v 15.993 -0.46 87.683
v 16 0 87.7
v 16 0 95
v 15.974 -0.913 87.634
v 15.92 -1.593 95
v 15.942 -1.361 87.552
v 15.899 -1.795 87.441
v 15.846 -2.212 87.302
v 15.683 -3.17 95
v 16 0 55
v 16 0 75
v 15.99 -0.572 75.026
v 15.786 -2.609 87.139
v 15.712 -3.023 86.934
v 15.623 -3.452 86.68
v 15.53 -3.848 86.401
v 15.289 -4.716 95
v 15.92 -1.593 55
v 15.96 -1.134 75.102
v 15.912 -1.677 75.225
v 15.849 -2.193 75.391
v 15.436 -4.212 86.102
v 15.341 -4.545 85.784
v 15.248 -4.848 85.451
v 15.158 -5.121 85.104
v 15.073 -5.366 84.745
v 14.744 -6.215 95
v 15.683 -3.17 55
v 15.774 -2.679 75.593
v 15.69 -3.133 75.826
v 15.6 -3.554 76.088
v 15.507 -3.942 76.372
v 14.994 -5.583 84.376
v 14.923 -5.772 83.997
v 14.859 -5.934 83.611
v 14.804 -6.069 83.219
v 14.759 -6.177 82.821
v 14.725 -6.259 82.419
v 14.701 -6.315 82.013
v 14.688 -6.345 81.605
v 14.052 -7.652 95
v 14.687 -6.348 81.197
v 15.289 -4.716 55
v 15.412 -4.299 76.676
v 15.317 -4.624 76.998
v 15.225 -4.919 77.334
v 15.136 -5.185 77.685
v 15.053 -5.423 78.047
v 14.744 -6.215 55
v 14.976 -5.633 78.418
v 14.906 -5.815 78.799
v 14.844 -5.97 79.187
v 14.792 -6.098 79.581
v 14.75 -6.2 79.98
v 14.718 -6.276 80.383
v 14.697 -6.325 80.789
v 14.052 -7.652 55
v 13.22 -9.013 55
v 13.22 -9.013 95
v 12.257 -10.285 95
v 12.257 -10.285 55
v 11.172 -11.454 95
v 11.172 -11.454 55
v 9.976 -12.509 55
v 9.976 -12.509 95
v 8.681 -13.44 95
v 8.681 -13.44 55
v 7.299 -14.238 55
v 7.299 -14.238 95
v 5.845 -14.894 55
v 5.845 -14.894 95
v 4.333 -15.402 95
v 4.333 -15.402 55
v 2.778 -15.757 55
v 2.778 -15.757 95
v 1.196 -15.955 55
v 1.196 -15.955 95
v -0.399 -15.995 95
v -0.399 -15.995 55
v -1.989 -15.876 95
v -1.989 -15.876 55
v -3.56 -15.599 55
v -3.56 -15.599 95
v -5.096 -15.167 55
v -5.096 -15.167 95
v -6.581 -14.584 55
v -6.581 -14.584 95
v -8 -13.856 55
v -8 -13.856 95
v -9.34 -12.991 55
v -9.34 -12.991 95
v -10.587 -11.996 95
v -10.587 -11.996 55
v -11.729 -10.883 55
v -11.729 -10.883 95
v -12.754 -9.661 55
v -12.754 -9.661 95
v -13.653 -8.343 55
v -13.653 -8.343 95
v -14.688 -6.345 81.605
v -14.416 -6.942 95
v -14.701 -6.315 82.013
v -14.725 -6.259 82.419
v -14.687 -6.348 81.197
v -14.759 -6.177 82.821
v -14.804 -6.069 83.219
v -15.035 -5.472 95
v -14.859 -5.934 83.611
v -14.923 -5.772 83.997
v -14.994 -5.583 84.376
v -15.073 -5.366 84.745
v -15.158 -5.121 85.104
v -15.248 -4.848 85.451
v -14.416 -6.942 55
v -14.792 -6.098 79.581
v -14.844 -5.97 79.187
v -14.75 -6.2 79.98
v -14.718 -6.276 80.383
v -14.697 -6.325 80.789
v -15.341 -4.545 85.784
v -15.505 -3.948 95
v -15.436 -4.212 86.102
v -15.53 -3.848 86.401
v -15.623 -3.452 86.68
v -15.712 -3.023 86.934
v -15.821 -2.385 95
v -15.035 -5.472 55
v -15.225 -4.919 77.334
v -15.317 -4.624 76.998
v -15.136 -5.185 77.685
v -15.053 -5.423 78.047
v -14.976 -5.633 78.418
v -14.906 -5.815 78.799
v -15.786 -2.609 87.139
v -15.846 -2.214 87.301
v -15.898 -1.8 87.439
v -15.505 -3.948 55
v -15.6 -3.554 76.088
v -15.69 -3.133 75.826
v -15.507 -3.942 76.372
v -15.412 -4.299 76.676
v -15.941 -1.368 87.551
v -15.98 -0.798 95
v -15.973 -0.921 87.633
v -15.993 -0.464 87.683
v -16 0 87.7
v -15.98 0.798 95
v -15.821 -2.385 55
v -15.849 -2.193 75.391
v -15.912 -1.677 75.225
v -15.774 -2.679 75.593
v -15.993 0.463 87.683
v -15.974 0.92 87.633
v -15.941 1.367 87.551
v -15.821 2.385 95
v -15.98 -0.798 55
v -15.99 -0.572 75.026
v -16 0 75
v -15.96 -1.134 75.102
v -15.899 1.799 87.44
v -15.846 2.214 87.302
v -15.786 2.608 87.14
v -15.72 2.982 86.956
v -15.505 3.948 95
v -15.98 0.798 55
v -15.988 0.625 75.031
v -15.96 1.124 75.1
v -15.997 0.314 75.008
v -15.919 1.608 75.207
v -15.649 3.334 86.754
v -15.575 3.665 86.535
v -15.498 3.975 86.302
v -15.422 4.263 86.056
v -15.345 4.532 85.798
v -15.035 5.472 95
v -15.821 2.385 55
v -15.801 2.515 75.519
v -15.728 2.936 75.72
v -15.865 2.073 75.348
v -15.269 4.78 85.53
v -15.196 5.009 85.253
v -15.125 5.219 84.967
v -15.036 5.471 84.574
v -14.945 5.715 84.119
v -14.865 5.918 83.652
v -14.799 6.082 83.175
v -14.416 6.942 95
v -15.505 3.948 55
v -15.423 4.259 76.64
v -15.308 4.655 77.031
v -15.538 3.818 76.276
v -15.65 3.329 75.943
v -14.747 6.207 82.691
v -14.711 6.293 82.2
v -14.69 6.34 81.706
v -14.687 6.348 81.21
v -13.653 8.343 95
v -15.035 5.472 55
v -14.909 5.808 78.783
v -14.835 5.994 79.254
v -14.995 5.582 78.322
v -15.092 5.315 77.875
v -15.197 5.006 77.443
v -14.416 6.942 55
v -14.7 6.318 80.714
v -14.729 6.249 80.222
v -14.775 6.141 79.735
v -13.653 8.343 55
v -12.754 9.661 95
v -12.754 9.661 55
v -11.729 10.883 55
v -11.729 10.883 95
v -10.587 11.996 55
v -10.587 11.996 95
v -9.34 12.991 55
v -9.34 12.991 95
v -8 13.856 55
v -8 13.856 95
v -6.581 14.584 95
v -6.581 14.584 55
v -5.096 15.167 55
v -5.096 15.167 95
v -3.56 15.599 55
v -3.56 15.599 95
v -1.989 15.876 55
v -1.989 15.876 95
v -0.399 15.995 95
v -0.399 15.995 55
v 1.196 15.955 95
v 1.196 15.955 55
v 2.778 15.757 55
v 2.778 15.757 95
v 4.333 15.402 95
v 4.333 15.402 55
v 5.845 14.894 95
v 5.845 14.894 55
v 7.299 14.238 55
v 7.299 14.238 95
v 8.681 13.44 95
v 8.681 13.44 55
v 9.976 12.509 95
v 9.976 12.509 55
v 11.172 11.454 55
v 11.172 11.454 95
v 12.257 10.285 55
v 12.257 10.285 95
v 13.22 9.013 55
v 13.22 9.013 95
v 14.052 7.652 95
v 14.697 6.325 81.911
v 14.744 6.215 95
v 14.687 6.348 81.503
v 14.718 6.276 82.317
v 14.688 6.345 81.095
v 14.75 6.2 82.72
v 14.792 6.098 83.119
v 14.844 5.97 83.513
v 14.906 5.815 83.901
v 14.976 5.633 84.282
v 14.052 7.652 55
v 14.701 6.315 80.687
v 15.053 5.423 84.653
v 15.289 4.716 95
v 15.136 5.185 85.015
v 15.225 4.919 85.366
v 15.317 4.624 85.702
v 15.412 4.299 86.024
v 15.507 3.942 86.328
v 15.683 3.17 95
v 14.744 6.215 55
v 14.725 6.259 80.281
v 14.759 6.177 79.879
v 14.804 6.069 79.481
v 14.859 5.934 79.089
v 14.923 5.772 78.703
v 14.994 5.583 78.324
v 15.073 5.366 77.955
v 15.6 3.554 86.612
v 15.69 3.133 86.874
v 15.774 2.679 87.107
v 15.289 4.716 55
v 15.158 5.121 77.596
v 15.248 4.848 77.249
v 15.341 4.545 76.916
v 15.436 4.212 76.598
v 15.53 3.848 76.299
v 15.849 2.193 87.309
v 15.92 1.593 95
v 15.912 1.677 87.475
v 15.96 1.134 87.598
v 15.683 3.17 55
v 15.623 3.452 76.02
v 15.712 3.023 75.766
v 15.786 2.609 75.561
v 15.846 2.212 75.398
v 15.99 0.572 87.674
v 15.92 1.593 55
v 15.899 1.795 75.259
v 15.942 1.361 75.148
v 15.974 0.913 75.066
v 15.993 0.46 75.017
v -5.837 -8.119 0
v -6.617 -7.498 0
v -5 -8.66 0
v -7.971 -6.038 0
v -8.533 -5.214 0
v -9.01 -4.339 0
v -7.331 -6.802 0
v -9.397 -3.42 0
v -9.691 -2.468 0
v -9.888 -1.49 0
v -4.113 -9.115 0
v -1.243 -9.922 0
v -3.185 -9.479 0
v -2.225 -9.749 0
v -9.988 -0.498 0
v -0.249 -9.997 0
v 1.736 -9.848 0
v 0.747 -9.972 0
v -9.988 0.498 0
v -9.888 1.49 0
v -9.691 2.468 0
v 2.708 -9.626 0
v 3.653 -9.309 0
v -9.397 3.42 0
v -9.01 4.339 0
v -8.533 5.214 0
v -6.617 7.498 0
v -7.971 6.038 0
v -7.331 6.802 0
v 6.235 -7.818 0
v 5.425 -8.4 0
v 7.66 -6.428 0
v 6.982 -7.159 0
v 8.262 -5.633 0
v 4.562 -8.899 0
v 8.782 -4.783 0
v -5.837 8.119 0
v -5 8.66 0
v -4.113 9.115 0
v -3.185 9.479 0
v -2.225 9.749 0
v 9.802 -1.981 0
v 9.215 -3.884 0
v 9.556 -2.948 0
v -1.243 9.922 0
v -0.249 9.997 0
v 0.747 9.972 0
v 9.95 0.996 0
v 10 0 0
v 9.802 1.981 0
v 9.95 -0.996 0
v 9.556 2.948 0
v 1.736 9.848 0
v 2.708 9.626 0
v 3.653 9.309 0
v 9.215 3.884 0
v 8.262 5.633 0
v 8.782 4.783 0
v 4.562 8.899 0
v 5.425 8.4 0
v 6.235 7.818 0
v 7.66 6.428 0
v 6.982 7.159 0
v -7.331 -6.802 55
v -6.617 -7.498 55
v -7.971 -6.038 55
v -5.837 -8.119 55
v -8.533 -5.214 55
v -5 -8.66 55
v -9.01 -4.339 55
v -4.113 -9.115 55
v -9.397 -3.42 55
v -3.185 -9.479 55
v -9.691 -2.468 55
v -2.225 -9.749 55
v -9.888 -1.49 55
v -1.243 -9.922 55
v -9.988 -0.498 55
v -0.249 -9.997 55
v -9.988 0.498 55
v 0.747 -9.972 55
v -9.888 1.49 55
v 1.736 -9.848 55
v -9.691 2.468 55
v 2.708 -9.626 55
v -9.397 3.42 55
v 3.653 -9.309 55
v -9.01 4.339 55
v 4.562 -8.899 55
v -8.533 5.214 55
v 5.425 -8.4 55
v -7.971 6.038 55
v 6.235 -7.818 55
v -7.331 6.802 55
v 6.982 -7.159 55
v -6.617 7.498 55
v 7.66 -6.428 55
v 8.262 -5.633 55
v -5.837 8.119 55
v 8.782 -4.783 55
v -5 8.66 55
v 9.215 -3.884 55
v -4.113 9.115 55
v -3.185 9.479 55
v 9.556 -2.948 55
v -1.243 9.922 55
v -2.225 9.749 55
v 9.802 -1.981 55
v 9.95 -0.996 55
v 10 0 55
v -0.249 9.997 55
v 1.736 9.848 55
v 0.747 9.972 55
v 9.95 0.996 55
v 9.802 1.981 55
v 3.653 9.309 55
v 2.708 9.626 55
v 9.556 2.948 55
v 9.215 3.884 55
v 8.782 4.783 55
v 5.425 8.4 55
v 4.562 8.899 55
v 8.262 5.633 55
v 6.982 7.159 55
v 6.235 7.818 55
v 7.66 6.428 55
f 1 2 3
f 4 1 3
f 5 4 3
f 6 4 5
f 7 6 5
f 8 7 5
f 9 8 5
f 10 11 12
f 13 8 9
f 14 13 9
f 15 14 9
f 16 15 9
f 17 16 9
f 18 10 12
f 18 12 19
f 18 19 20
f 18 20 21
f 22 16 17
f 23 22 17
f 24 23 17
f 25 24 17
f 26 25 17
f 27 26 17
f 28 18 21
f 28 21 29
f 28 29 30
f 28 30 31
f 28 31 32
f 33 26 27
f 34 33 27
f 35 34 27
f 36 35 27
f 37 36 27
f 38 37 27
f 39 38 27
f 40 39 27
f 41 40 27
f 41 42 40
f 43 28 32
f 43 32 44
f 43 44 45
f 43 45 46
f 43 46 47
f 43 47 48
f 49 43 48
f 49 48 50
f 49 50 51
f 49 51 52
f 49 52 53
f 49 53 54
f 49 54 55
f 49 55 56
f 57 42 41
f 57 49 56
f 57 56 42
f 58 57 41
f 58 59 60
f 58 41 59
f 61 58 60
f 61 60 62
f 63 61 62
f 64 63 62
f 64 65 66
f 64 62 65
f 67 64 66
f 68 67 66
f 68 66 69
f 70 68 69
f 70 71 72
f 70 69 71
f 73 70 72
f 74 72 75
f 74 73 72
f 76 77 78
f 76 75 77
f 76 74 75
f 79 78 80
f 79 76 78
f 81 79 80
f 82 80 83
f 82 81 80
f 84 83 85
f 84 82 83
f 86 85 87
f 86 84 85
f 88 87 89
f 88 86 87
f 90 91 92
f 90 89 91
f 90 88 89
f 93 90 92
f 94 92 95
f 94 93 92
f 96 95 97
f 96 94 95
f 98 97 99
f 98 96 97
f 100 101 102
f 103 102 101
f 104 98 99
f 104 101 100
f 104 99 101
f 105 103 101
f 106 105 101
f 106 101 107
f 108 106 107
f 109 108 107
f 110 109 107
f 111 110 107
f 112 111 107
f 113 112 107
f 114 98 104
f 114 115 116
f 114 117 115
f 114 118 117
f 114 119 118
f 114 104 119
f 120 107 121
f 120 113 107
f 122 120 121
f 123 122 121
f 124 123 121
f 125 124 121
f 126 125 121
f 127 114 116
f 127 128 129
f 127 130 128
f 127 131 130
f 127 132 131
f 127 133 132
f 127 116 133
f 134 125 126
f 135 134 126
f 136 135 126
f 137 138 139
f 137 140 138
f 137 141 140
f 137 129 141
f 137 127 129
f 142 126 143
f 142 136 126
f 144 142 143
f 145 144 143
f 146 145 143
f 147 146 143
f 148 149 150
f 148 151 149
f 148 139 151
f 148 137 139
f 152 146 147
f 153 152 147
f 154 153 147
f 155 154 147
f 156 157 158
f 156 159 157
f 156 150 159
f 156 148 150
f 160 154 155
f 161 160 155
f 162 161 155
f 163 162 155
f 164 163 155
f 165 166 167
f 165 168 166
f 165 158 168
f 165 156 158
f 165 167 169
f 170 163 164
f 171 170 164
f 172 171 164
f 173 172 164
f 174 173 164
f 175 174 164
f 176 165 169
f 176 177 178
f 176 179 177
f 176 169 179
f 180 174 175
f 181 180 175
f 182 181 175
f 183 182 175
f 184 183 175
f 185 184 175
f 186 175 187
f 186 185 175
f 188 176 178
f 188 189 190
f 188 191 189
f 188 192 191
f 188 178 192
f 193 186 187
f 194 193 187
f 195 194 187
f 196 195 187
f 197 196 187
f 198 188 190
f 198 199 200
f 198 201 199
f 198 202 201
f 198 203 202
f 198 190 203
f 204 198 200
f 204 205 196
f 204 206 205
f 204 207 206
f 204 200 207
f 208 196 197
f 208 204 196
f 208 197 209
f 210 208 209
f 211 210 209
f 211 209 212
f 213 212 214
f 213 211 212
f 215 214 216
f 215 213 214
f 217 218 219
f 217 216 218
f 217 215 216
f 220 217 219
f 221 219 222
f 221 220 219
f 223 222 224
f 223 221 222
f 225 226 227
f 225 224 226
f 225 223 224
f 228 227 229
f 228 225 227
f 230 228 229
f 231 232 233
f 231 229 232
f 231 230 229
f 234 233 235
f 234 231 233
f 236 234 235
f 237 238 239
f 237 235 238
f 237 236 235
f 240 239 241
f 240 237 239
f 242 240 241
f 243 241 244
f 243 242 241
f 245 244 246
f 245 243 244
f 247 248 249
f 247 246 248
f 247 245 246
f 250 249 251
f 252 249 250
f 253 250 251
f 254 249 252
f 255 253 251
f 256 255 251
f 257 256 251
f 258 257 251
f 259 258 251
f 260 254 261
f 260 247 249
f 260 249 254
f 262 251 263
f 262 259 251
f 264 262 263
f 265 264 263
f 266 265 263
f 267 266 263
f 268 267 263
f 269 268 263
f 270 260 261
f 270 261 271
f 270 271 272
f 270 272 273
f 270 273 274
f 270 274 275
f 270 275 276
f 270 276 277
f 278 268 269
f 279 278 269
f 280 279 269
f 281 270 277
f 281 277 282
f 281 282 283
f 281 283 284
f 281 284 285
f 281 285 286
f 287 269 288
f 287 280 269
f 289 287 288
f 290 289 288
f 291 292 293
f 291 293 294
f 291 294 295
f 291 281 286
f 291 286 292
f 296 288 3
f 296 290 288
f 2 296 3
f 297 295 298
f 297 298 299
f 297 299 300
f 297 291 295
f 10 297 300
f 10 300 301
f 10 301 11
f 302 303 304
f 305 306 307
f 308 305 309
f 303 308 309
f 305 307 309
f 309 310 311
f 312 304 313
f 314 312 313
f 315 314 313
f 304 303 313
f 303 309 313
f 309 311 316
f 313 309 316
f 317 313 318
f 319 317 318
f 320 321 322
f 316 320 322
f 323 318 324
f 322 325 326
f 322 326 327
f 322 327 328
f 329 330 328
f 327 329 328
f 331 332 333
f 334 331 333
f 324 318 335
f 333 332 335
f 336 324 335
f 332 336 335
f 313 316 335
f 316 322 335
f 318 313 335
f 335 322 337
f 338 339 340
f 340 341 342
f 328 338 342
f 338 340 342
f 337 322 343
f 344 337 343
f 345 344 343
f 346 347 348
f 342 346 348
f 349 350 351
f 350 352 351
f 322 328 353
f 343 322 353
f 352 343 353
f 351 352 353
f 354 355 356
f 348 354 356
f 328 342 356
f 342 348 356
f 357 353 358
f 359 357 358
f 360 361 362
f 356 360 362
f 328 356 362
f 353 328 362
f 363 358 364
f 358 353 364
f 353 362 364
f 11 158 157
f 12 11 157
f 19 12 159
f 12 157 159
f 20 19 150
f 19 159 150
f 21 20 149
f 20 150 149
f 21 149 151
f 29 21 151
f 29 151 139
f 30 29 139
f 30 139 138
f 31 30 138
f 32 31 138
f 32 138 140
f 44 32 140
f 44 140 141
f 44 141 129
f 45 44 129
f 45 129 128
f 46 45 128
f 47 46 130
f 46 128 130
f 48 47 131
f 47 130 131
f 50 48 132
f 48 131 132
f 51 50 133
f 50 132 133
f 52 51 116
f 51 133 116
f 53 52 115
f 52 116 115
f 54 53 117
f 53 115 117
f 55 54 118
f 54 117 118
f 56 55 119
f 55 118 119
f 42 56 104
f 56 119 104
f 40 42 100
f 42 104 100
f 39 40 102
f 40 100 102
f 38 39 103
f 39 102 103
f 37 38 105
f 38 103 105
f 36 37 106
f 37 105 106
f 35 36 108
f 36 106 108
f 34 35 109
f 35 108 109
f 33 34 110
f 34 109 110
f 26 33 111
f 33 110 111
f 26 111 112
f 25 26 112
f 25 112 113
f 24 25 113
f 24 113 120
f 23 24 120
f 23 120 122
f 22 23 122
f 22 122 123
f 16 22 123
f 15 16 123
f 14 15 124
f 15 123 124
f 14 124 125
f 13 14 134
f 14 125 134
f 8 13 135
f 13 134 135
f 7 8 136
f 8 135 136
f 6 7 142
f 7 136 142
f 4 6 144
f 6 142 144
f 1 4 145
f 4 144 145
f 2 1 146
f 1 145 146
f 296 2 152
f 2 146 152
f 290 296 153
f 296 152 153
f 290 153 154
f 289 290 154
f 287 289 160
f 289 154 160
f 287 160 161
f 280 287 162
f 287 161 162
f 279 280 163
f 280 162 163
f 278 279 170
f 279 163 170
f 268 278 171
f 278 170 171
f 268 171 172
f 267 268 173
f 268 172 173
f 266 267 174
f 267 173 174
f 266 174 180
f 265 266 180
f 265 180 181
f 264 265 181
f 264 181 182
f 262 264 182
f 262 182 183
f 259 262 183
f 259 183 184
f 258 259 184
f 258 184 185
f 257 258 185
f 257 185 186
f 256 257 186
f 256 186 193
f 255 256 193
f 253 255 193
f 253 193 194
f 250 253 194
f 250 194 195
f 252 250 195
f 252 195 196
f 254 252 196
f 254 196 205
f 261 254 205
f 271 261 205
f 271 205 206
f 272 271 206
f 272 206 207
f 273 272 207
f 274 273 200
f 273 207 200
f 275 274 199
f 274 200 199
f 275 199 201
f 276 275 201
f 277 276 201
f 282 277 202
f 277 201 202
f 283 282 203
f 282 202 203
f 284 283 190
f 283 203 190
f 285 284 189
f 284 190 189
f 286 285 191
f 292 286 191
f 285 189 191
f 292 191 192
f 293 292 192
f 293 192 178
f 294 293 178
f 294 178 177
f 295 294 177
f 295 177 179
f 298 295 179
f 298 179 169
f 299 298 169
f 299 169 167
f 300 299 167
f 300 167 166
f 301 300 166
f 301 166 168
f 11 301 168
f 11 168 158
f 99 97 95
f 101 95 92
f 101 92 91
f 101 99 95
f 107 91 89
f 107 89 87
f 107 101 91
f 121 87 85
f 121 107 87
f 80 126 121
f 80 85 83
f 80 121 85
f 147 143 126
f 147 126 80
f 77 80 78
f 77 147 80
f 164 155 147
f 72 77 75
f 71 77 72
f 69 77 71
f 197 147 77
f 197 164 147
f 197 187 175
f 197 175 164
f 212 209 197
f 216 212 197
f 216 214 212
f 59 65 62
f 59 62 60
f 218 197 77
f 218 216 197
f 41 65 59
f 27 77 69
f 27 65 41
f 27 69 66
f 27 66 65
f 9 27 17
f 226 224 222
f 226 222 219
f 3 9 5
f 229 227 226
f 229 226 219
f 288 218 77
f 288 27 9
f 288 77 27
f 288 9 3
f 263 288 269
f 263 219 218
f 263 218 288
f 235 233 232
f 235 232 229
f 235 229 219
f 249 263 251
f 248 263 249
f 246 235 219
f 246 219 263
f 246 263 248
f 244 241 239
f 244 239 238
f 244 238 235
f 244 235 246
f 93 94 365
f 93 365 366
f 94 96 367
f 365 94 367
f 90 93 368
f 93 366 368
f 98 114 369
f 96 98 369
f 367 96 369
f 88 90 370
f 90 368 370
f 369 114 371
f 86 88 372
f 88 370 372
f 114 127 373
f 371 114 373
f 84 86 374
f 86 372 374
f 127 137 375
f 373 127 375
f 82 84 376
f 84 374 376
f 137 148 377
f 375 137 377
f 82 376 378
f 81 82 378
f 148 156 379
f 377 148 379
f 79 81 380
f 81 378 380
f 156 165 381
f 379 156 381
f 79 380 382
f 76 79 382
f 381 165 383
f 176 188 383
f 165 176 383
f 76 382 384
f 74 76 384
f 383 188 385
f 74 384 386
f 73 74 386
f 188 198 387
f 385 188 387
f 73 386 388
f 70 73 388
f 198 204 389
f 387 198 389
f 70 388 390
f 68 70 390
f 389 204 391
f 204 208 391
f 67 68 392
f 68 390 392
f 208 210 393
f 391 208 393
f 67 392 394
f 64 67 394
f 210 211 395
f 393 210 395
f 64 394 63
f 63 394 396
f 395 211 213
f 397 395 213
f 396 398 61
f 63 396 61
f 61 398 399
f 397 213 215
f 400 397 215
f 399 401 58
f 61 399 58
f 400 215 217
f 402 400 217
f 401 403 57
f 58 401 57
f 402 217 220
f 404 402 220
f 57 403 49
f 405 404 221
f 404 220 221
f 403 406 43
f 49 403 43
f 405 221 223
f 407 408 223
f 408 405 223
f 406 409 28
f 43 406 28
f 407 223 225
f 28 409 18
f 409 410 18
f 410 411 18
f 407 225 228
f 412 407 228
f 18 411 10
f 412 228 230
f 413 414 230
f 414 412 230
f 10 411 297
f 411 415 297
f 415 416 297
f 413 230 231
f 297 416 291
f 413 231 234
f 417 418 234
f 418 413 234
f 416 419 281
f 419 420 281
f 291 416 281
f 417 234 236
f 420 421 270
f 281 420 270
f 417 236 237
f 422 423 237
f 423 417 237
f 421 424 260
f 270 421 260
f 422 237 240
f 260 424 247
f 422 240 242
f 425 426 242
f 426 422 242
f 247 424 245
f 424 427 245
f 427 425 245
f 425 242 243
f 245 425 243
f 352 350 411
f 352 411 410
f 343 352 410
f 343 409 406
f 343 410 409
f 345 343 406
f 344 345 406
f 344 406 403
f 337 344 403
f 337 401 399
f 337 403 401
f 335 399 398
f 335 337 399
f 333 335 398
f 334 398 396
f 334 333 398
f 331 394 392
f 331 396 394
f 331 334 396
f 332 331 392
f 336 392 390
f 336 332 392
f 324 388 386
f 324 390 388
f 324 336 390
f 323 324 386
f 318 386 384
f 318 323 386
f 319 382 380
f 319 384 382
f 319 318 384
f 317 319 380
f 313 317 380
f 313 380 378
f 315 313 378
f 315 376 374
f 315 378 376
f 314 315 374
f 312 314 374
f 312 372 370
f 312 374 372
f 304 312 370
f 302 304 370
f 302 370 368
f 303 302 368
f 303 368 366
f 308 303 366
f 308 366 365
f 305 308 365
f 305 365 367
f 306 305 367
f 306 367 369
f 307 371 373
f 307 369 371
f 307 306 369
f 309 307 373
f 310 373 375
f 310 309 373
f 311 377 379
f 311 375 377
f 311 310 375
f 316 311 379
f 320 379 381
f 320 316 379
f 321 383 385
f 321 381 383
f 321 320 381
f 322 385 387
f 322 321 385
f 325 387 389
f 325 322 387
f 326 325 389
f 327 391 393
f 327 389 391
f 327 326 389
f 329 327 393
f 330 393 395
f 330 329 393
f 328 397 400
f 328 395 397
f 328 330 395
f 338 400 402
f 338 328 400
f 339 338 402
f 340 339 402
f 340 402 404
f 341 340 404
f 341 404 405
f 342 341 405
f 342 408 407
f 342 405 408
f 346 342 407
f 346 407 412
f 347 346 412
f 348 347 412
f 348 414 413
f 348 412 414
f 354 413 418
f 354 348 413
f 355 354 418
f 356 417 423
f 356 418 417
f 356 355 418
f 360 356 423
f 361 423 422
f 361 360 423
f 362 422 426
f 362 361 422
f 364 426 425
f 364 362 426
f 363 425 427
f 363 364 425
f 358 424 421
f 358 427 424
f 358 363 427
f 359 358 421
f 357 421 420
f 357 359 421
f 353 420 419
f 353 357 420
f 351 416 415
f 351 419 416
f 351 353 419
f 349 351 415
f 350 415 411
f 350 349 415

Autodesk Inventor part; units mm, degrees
ref_plane "YZ Plane" through (0, 0, 0) normal (1, 0, 0) x (0, 1, 0)
ref_plane "XZ Plane" through (0, 0, 0) normal (0, 1, 0) x (-1, 0, 0)
ref_plane "XY Plane" through (0, 0, 0) normal (0, 0, 1) x (1, 0, 0)
sketch "Sketch1" plane through (0, 0, 0) normal (0, 0, 1) x (1, 0, 0)
  circle A0 centre (0, 0) radius 10
  dimension "d0" = 20
extrude "Extrusion1" add sketch "Sketch1" along normal blind 55
sketch "Sketch2" plane through (0, 0, 55) normal (0, 0, 1) x (1, 0, 0)
  circle A0 centre (0, 0) radius 16
  dimension "d3" = 32
extrude "Extrusion2" add sketch "Sketch2" along normal blind 40
sketch "Sketch3" plane through (0, 0, 0) normal (1, 0, 0) x (0, 1, 0)
  line L0 (16, 55) -> (-16, 55) projected
  point P0 (0, 0)
  point P1 (0, 81.35)
  dimension "d6" = 26.35
hole "Hole1" at (0, 0, 81.35) direction (-1, 0, 0) diameter 12.7 end through all both
thread "Thread1" size "M20x2.5" class "6g" standard "ANSI Metric M Profile" full length
properties part number "CompressionGripAttachment"
